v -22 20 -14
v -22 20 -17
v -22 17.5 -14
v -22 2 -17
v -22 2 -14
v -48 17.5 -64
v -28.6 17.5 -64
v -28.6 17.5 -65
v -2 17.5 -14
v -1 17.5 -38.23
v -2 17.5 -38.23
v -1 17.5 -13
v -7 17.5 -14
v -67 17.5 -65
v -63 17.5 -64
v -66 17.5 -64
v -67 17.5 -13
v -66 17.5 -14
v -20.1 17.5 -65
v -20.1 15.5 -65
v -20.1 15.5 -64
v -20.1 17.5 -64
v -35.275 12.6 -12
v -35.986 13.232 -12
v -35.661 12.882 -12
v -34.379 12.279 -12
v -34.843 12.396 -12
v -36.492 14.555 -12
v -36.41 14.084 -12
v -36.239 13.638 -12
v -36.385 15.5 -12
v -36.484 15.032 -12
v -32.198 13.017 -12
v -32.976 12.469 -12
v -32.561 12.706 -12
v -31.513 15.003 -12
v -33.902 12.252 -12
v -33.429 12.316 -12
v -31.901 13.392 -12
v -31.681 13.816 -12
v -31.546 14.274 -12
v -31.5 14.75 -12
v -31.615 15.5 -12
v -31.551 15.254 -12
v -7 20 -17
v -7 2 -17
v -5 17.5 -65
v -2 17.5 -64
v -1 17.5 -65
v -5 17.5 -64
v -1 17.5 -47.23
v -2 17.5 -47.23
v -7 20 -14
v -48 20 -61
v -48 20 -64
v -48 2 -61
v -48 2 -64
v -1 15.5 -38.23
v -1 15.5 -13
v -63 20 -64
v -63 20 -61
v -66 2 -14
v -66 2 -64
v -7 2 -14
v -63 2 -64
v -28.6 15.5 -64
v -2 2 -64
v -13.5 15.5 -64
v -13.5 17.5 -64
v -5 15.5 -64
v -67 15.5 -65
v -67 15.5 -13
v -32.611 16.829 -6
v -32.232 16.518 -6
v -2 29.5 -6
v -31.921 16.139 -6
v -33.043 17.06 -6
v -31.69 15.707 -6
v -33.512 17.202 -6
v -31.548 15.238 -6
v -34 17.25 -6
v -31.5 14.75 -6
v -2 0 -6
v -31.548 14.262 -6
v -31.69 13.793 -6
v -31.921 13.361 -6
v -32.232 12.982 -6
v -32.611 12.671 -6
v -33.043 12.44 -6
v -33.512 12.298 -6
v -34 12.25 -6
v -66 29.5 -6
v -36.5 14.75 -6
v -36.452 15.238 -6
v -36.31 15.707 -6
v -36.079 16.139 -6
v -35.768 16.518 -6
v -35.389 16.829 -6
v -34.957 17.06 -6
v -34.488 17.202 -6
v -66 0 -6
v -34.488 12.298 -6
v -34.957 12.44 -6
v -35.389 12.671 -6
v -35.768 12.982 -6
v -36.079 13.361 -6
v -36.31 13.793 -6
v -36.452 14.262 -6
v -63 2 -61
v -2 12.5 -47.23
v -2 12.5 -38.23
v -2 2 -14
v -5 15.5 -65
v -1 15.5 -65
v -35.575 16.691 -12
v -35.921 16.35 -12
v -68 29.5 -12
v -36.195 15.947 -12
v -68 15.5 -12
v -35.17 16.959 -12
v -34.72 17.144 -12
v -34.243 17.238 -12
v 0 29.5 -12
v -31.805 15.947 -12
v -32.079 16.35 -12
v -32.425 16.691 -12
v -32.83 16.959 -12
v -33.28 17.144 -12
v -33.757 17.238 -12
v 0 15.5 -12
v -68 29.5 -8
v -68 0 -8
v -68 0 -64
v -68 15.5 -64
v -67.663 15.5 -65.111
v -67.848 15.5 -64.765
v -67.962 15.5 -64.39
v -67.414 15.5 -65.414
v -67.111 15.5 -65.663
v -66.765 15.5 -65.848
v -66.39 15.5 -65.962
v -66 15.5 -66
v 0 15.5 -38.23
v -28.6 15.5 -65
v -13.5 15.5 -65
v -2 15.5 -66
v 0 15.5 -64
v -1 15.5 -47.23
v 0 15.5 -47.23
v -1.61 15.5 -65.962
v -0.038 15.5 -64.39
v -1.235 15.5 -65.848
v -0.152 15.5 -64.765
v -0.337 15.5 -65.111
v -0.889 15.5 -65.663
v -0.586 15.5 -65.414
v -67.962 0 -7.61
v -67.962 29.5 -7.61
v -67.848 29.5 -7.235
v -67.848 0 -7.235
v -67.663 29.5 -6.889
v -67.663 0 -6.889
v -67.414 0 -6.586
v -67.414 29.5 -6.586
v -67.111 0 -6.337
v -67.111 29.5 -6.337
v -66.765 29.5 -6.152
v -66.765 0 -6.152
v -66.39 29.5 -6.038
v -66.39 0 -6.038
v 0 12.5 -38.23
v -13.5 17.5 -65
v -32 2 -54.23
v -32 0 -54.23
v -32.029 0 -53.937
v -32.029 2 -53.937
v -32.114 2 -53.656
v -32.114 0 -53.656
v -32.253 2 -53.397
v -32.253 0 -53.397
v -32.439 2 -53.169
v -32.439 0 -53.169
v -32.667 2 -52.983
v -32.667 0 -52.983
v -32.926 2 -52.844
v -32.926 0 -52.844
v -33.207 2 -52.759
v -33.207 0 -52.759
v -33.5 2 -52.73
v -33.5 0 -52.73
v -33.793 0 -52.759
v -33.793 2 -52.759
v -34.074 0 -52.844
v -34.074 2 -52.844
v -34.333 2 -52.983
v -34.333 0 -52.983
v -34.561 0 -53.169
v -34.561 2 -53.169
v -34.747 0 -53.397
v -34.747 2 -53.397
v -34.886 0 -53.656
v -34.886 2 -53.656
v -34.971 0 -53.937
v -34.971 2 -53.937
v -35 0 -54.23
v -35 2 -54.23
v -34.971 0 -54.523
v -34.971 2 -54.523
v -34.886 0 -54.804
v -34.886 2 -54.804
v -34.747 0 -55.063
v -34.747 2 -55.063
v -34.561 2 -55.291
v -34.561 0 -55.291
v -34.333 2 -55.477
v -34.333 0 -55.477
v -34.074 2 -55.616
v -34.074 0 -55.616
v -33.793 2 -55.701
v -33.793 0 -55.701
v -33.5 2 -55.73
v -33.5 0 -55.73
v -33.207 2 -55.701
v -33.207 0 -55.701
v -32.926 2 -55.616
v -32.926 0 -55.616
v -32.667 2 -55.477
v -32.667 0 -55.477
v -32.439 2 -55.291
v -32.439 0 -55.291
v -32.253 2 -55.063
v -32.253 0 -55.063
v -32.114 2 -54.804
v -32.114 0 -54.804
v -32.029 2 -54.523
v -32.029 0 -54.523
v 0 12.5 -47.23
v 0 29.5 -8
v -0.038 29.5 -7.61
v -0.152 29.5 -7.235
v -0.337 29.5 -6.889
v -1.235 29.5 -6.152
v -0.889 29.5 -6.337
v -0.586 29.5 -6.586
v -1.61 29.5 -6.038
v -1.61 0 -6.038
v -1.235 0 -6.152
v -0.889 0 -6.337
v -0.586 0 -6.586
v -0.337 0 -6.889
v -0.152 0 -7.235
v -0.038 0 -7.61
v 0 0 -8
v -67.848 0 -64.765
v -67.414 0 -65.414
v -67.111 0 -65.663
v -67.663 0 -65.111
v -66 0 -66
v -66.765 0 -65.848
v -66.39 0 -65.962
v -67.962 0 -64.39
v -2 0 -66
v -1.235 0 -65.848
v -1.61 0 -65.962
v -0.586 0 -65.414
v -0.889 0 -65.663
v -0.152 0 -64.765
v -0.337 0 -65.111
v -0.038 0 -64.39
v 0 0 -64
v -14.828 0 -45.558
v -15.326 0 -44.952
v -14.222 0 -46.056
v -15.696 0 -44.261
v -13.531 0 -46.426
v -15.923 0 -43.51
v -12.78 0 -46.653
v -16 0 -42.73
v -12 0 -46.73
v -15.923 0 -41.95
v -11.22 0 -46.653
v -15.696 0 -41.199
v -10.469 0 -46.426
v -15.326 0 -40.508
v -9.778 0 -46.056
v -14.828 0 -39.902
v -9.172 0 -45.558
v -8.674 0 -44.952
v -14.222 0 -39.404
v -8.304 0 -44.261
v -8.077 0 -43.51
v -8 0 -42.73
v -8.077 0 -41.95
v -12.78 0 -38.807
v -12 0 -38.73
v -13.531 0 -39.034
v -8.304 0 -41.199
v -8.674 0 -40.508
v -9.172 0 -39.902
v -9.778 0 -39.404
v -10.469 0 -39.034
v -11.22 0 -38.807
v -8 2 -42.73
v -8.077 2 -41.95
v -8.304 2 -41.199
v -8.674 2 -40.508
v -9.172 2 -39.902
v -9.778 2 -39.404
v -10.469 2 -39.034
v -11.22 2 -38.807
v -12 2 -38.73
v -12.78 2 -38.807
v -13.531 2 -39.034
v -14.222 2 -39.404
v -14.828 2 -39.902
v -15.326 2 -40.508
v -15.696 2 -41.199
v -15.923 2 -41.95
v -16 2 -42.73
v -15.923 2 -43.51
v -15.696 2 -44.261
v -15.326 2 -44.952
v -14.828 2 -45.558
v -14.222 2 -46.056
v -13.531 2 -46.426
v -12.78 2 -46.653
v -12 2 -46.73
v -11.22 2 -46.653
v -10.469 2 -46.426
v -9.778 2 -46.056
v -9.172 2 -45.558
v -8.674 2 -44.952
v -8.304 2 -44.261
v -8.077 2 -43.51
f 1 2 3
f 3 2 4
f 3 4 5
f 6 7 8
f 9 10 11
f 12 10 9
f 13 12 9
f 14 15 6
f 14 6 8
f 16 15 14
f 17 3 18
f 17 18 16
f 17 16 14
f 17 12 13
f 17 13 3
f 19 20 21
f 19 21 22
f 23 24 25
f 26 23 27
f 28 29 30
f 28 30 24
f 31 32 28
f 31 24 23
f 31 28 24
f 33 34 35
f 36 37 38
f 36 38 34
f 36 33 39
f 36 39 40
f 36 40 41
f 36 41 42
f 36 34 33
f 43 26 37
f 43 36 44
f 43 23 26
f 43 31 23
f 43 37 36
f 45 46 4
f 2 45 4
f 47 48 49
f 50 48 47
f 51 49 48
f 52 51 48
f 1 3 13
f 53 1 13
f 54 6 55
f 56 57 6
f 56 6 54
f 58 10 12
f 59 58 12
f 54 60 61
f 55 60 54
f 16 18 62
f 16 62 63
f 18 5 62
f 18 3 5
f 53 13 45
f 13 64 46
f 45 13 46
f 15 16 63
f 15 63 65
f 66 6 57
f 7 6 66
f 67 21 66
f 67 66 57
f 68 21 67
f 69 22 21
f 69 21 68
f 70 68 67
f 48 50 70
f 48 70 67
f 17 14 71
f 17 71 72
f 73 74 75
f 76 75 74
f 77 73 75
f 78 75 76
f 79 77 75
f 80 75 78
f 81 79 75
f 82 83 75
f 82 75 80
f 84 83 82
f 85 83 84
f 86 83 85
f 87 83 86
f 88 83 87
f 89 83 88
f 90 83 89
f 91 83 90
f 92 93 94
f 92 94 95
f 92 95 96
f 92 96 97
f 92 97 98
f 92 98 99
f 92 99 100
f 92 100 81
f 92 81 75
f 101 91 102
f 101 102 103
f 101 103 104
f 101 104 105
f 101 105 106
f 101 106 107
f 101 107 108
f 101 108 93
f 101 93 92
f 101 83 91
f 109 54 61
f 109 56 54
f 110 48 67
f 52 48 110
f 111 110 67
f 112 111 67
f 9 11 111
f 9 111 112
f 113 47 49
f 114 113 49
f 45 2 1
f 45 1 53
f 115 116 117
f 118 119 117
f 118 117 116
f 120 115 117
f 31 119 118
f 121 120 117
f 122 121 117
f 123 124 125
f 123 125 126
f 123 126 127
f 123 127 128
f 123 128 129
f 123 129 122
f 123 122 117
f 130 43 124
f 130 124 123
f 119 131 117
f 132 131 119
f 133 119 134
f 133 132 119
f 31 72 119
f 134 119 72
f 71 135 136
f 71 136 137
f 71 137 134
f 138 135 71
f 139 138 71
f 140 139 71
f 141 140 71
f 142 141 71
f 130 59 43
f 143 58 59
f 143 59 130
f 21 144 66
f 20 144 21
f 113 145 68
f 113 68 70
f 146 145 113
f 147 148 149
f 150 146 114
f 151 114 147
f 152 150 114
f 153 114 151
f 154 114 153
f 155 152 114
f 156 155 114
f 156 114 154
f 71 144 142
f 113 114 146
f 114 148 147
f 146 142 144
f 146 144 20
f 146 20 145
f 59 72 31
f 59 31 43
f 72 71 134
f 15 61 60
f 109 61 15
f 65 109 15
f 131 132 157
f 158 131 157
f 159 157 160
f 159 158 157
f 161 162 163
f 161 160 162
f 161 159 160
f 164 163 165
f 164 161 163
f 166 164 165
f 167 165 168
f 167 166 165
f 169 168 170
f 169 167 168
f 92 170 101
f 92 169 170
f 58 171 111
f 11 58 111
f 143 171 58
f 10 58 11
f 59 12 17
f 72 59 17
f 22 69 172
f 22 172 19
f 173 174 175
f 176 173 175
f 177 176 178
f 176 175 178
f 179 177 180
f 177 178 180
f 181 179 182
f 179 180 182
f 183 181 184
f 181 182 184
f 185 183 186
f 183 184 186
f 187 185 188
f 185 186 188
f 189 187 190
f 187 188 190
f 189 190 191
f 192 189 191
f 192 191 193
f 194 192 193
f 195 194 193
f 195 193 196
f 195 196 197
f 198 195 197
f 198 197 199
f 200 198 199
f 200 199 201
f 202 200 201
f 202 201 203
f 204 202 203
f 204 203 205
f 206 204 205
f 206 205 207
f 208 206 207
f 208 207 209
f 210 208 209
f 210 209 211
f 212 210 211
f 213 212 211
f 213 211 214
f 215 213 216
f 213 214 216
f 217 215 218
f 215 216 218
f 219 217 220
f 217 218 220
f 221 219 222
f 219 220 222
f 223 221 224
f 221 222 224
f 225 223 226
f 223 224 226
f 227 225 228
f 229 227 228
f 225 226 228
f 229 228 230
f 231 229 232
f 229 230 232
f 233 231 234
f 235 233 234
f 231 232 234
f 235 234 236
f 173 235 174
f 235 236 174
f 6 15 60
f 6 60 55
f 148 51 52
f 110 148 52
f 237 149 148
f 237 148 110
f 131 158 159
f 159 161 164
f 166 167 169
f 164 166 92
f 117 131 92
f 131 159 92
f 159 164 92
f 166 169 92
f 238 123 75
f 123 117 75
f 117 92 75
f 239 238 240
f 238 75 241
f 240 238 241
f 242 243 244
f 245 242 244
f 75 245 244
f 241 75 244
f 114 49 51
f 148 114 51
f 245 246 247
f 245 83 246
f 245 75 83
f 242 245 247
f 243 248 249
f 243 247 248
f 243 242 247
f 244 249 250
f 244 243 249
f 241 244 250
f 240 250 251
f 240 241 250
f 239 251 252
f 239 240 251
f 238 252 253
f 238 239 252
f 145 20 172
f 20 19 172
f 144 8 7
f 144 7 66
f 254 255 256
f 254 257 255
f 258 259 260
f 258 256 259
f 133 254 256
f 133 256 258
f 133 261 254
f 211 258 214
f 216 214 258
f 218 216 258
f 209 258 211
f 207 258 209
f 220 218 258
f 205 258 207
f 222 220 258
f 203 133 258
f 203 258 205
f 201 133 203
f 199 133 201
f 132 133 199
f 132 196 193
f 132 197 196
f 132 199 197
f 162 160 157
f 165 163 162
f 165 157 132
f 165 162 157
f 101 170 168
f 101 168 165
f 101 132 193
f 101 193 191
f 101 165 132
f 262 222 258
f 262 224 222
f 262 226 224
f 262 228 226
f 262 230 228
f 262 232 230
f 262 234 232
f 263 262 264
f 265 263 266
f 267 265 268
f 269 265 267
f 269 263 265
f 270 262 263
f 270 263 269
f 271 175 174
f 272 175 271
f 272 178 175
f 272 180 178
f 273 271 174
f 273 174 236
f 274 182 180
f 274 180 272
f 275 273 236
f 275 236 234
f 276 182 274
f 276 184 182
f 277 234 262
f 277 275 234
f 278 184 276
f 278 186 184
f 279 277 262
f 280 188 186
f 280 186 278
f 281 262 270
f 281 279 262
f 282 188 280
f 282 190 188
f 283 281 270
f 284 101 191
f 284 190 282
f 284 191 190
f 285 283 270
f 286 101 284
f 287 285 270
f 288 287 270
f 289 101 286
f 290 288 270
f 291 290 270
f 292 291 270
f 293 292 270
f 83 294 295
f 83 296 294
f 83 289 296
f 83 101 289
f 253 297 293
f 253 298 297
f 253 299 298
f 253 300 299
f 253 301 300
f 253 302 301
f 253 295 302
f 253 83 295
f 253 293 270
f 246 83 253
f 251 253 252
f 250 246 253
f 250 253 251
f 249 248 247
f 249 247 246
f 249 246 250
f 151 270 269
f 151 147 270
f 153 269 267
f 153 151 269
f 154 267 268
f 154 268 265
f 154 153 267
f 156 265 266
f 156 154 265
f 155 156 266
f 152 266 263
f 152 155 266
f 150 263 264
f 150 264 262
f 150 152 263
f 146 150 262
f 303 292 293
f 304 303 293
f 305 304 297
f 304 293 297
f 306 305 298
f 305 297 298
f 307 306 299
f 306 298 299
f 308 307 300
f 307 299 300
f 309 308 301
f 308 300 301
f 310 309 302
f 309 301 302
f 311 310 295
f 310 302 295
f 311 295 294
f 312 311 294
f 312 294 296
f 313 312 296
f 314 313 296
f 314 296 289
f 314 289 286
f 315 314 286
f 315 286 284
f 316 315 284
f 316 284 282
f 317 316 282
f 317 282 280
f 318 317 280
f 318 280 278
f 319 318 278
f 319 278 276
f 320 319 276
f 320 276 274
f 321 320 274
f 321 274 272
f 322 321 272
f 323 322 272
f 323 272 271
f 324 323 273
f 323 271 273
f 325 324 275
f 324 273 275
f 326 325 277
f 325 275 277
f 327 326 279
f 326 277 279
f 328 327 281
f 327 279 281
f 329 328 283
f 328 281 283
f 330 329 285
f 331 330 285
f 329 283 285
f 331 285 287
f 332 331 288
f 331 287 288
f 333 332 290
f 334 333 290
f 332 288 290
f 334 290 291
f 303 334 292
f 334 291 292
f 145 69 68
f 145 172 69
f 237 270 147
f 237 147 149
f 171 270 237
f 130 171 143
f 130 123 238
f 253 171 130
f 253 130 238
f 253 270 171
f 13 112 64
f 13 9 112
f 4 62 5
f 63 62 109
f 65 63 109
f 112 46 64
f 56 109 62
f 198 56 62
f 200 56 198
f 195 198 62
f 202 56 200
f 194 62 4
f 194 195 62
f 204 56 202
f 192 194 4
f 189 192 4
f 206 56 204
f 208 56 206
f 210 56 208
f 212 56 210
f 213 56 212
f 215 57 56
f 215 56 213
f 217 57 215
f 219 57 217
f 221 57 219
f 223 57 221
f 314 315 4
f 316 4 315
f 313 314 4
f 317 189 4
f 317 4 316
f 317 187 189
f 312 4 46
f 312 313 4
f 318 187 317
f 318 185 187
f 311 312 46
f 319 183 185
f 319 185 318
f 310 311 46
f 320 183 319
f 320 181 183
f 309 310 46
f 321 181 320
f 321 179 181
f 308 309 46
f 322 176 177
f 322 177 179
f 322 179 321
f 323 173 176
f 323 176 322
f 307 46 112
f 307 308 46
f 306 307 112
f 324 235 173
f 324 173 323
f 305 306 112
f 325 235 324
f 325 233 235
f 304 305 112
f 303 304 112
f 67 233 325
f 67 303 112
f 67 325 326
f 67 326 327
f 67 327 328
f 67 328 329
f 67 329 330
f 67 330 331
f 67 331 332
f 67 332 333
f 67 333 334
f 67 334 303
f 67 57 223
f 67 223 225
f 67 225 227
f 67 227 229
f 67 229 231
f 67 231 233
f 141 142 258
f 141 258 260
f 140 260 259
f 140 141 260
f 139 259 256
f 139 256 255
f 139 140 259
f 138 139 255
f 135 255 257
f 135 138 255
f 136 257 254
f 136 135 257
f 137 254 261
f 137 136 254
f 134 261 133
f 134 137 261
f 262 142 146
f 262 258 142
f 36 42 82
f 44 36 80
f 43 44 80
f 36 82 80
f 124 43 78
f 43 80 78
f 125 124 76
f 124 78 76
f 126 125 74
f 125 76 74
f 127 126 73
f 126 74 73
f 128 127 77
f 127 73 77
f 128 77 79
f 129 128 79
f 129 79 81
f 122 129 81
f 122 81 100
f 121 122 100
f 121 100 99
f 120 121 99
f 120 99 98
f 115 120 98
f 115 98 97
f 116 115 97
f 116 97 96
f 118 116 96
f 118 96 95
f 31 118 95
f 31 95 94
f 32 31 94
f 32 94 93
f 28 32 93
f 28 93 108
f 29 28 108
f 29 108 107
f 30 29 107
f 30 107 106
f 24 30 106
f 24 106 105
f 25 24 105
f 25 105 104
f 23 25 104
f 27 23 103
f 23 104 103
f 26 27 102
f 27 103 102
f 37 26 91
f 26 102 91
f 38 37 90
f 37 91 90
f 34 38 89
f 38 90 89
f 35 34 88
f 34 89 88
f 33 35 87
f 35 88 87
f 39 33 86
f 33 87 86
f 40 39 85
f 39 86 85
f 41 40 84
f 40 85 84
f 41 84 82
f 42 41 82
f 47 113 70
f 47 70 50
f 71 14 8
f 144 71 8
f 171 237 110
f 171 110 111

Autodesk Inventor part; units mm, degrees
ref_plane "YZ Plane" through (0, 0, 0) normal (1, 0, 0) x (0, 1, 0)
ref_plane "XZ Plane" through (0, 0, 0) normal (0, 1, 0) x (-1, 0, 0)
ref_plane "XY Plane" through (0, 0, 0) normal (0, 0, 1) x (1, 0, 0)
sketch "Sketch1" plane through (0, 0, 0) normal (0, 1, 0) x (-1, 0, 0)
  point P0 (0, 0)
sketch "Sketch2" plane through (0, 0, 0) normal (0, 1, 0) x (-1, 0, 0)
  line L0 (68, -12) -> (68, -66)
  line L1 (68, -66) -> (0, -66)
  line L2 (0, -66) -> (0, -12)
  line L3 (68, -12) -> (0, -12)
  point P0 (0, 0)
  dimension "d0" = 68
  dimension "d138" = 54
extrude "Extrusion1" add sketch "Sketch2" along normal blind 17.5
sketch "Sketch3" plane through (0, 17.5, 0) normal (0, 1, 0) x (1, 0, 0)
  line L0 (0, 66) -> (-68, 66) projected
  line L1 (-68, 66) -> (0, 66)
  line L2 (-68, 66) -> (0, 66)
  line L3 (0, 66) -> (-68, 66)
  line L4 (-68, 66) -> (-68, 12)
  line L5 (-68, 12) -> (0, 12)
  line L6 (0, 66) -> (0, 12)
  dimension "d135" = 68
  dimension "d136" = 54
sketch "Sketch4" plane through (0, 17.5, 0) normal (0, 1, 0) x (1, 0, 0)
  line L0 (0, 66) -> (-68, 66) projected
  line L1 (-30.4814, 66) -> (-28.4814, 66)
  line L2 (-28.4814, 66) -> (-28.4814, 64)
  line L3 (-68, 66) -> (-68, 12) projected
  line L4 (-68, 37.8423) -> (-68, 39.8423)
  line L5 (-68, 39.8423) -> (-66, 39.8423)
  line L6 (0, 38.8423) -> (0, 36.8423)
  line L7 (0, 36.8423) -> (-2, 36.8423)
  line L8 (-66, 64) -> (-2, 64)
  line L9 (-2, 64) -> (-2, 14)
  line L10 (-2, 14) -> (-66, 14)
  line L11 (-66, 14) -> (-66, 64)
  dimension "d5" = 2
  dimension "d6" = 2
  dimension "d7" = 2
  dimension "d11" = 2
  dimension "d75" = 2
  dimension "d132" = 50
  dimension "d133" = 64
extrude "Extrusion2" cut sketch "Sketch4" against normal blind 15.5 contours L8 L9 L10 L11
sketch "Sketch7" plane through (0, 17.5, 0) normal (0, 1, 0) x (1, 0, 0)
  line L0 (-68, 66) -> (-67, 66)
  line L1 (-68, 66) -> (-6, 66)
  line L2 (-68, 65) -> (-68, 66)
  line L3 (0, 66) -> (-7, 66)
  line L4 (-67, 65) -> (-1, 65)
  line L5 (0, 66) -> (-68, 66) projected
  line L6 (-68, 66) -> (0, 66)
  line L7 (0, 12) -> (0, 66) projected
  line L8 (0, 12) -> (-1, 12)
  line L9 (-1, 66) -> (0, 66)
  line L10 (0, 66) -> (0, 12)
  line L11 (0, 12) -> (-1, 12)
  line L12 (-68, 12) -> (0, 12) projected
  line L13 (-1, 65) -> (-1, 12)
  line L14 (0, 12) -> (-1, 12)
  line L15 (-67, 65) -> (-67, 12)
  line L16 (-68, 66) -> (-68, 12) projected
  line L17 (-67, 12) -> (-68, 12)
  line L18 (-68, 12) -> (-68, 66)
  dimension "d76" = 1
  dimension "d139" = 1
  dimension "d140" = 1
extrude "Extrusion3" cut sketch "Sketch7" against normal blind 2 contours L0 L1 L3 L7 L8 L13 L4 L15 L12 L16 L2
sketch "Sketch8" plane through (0, 17.5, 0) normal (0, 1, 0) x (1, 0, 0)
  line L0 (0, 12) -> (0, 13)
  line L1 (0, 13) -> (-68, 13)
  line L2 (0, 12) -> (-68, 12)
  line L3 (-68, 12) -> (-68, 13)
  line L4 (-67, 12) -> (-1, 12) projected
  point P0 (0, 0)
  point P1 (-70, 0)
  dimension "d46" = 68
  dimension "d141" = 1
extrude "Extrusion4" cut sketch "Sketch8" against normal blind 2
sketch "Sketch10" plane through (0, 2, 0) normal (0, 1, 0) x (1, 0, 0)
  line L0 (-31, 2) -> (-41, 2)
  line L1 (-63, 64) -> (-48, 64)
  line L2 (-48, 64) -> (-48, 61)
  line L3 (-48, 61) -> (-63, 61)
  line L4 (-63, 61) -> (-63, 64)
  line L5 (-22, 14) -> (-7, 14)
  line L6 (-7, 14) -> (-7, 17)
  line L7 (-7, 17) -> (-22, 17)
  line L8 (-22, 17) -> (-22, 14)
  line L9 (-66, 14) -> (-66, 64) projected
  line L10 (-2, 14) -> (-66, 14) projected
  line L11 (-66, 64) -> (-2, 64)
  line L12 (-2, 64) -> (-2, 14)
  line L13 (-2, 14) -> (-66, 14)
  line L14 (-66, 14) -> (-66, 64)
  point P0 (0, 0)
  point P1 (-21, 64)
  dimension "d57" = 15
  dimension "d58" = 3
  dimension "d61" = 15
  dimension "d79" = 3
extrude "Extrusion5" add sketch "Sketch10" along normal blind 18 contours L1 L2 L3 L4 | L8 L7 L6 L5
sketch "Sketch11" plane through (0, 0, 0) normal (0, -1, 0) x (1, 0, 0)
  circle A0 centre (-12, -42.73) radius 4
  circle A1 centre (-33.5, -54.23) radius 1.5
  line L0 (0, 0) -> (0, -66) projected
  line L1 (0, -66) -> (-68, -66) projected
  line L2 (-2, -64) -> (-2, -14) projected
  dimension "d85" = 23.27
  dimension "d86" = 21.5
  dimension "d88" = 8
  dimension "d89" = 3
  dimension "d119" = 11.5
  dimension "d120" = 10
extrude "Extrusion6" cut sketch "Sketch11" against normal blind 9
sketch "Sketch12" plane through (0, 0, 0) normal (0, -1, 0) x (1, 0, 0)
  line L0 (-68, -12) -> (-68, -66) projected
  line L1 (0, -12) -> (0, -6)
  line L2 (0, -6) -> (-68, -6)
  line L3 (-68, -6) -> (-68, -12)
  line L4 (-68, -12) -> (0, -12)
  line L5 (0, -12) -> (-68, -12) projected
  point P0 (0, 0)
  point P1 (-70, 0)
  dimension "d81" = 6
  dimension "d143" = 68
  dimension "d144" = 0
extrude "Extrusion7" add sketch "Sketch12" against normal blind 29.5
sketch "Sketch15" plane through (0, 0, -66) normal (1, 0, 0) x (0, 0, -1)
  line L0 (-27.77, 17.5) -> (-18.77, 17.5)
  line L1 (-18.77, 17.5) -> (-18.77, 12.5)
  line L2 (-18.77, 12.5) -> (-27.77, 12.5)
  line L3 (-27.77, 12.5) -> (-27.77, 17.5)
  line L4 (-54, 0) -> (-54, 29.5) projected
  line L5 (0, 0) -> (0, 15.5) projected
  line L6 (0, 0) -> (-60, 0) projected
  line L7 (0, 15.5) -> (-54, 15.5) projected
  line L8 (-23.27, -7.8454) -> (-23.27, 0)
  line L9 (-23.27, 0) -> (-23.27, 15.5)
  point P0 (-66, 0)
  point P1 (-66, 14.75)
  point P2 (0, 16.75)
  dimension "d108" = 9
  dimension "d109" = 5
  dimension "d111" = 27.77
extrude "Extrusion9" cut sketch "Sketch15" against normal blind 10 contours L0 L1 L7 L3 | L7 L9 L2 L3 | L1 L2 L9 L7
fillet "Fillet7" radius 2 1 edges at (0, 7.75, -66)
fillet "Fillet8" radius 2 1 edges at (-68, 7.75, -66)
fillet "Fillet9" radius 2 1 edges at (0, 14.75, -6)
fillet "Fillet11" radius 2 1 edges at (-68, 14.75, -6)
sketch "Sketch16" plane through (-2, 0, -6) normal (0, 0, 1) x (1, 0, 0)
  line L0 (2, 29.5) -> (-66, 29.5) projected
  line L1 (-32, 29.5) -> (-32, 0)
  line L2 (-46, 2) -> (0, 2) projected
  line L3 (-66, 0) -> (-66, 15.5) projected
  line L4 (-66, 15.5) -> (-66, 29.5) projected
  line L5 (-32, 14.75) -> (-64, 14.75)
  line L6 (-64, 0) -> (-64, 29.5) projected
  circle A0 centre (-32, 14.75) radius 2.5
  point P0 (2, 0)
  dimension "d148" = 5
extrude "Extrusion10" cut sketch "Sketch16" against normal blind 6 contours A0 L1 | L1 L5 A0 | L1 A0 L5
sketch "Sketch17" plane through (-2, 0, -66) normal (0, 0, -1) x (-1, 0, 0)
  line L0 (3, 20.5) -> (11.5, 20.5)
  line L1 (11.5, 20.5) -> (11.5, 15.5)
  line L2 (11.5, 15.5) -> (3, 15.5)
  line L3 (3, 15.5) -> (3, 20.5)
  line L4 (18.1, 20.5) -> (26.6, 20.5)
  line L5 (26.6, 20.5) -> (26.6, 15.5)
  line L6 (26.6, 15.5) -> (18.1, 15.5)
  line L7 (18.1, 15.5) -> (18.1, 20.5)
  line L8 (66, 0) -> (66, 15.5) projected
  line L9 (-1, 17.5) -> (65, 17.5) projected
  line L10 (64, 15.5) -> (0, 15.5) projected
  line L11 (-2, 15.5) -> (-2, 0) projected
  dimension "d151" = 8.5
  dimension "d152" = 8.5
  dimension "d153" = 5
  dimension "d157" = 0
  dimension "d158" = 13.5
  dimension "d160" = 28.6
extrude "Extrusion11" cut sketch "Sketch17" against normal blind 10 contours L0 L1 L9 L3 | L9 L1 L2 L3 | L9 L5 L6 L7 | L7 L4 L5 L9
properties part number "Shell 3 top"
